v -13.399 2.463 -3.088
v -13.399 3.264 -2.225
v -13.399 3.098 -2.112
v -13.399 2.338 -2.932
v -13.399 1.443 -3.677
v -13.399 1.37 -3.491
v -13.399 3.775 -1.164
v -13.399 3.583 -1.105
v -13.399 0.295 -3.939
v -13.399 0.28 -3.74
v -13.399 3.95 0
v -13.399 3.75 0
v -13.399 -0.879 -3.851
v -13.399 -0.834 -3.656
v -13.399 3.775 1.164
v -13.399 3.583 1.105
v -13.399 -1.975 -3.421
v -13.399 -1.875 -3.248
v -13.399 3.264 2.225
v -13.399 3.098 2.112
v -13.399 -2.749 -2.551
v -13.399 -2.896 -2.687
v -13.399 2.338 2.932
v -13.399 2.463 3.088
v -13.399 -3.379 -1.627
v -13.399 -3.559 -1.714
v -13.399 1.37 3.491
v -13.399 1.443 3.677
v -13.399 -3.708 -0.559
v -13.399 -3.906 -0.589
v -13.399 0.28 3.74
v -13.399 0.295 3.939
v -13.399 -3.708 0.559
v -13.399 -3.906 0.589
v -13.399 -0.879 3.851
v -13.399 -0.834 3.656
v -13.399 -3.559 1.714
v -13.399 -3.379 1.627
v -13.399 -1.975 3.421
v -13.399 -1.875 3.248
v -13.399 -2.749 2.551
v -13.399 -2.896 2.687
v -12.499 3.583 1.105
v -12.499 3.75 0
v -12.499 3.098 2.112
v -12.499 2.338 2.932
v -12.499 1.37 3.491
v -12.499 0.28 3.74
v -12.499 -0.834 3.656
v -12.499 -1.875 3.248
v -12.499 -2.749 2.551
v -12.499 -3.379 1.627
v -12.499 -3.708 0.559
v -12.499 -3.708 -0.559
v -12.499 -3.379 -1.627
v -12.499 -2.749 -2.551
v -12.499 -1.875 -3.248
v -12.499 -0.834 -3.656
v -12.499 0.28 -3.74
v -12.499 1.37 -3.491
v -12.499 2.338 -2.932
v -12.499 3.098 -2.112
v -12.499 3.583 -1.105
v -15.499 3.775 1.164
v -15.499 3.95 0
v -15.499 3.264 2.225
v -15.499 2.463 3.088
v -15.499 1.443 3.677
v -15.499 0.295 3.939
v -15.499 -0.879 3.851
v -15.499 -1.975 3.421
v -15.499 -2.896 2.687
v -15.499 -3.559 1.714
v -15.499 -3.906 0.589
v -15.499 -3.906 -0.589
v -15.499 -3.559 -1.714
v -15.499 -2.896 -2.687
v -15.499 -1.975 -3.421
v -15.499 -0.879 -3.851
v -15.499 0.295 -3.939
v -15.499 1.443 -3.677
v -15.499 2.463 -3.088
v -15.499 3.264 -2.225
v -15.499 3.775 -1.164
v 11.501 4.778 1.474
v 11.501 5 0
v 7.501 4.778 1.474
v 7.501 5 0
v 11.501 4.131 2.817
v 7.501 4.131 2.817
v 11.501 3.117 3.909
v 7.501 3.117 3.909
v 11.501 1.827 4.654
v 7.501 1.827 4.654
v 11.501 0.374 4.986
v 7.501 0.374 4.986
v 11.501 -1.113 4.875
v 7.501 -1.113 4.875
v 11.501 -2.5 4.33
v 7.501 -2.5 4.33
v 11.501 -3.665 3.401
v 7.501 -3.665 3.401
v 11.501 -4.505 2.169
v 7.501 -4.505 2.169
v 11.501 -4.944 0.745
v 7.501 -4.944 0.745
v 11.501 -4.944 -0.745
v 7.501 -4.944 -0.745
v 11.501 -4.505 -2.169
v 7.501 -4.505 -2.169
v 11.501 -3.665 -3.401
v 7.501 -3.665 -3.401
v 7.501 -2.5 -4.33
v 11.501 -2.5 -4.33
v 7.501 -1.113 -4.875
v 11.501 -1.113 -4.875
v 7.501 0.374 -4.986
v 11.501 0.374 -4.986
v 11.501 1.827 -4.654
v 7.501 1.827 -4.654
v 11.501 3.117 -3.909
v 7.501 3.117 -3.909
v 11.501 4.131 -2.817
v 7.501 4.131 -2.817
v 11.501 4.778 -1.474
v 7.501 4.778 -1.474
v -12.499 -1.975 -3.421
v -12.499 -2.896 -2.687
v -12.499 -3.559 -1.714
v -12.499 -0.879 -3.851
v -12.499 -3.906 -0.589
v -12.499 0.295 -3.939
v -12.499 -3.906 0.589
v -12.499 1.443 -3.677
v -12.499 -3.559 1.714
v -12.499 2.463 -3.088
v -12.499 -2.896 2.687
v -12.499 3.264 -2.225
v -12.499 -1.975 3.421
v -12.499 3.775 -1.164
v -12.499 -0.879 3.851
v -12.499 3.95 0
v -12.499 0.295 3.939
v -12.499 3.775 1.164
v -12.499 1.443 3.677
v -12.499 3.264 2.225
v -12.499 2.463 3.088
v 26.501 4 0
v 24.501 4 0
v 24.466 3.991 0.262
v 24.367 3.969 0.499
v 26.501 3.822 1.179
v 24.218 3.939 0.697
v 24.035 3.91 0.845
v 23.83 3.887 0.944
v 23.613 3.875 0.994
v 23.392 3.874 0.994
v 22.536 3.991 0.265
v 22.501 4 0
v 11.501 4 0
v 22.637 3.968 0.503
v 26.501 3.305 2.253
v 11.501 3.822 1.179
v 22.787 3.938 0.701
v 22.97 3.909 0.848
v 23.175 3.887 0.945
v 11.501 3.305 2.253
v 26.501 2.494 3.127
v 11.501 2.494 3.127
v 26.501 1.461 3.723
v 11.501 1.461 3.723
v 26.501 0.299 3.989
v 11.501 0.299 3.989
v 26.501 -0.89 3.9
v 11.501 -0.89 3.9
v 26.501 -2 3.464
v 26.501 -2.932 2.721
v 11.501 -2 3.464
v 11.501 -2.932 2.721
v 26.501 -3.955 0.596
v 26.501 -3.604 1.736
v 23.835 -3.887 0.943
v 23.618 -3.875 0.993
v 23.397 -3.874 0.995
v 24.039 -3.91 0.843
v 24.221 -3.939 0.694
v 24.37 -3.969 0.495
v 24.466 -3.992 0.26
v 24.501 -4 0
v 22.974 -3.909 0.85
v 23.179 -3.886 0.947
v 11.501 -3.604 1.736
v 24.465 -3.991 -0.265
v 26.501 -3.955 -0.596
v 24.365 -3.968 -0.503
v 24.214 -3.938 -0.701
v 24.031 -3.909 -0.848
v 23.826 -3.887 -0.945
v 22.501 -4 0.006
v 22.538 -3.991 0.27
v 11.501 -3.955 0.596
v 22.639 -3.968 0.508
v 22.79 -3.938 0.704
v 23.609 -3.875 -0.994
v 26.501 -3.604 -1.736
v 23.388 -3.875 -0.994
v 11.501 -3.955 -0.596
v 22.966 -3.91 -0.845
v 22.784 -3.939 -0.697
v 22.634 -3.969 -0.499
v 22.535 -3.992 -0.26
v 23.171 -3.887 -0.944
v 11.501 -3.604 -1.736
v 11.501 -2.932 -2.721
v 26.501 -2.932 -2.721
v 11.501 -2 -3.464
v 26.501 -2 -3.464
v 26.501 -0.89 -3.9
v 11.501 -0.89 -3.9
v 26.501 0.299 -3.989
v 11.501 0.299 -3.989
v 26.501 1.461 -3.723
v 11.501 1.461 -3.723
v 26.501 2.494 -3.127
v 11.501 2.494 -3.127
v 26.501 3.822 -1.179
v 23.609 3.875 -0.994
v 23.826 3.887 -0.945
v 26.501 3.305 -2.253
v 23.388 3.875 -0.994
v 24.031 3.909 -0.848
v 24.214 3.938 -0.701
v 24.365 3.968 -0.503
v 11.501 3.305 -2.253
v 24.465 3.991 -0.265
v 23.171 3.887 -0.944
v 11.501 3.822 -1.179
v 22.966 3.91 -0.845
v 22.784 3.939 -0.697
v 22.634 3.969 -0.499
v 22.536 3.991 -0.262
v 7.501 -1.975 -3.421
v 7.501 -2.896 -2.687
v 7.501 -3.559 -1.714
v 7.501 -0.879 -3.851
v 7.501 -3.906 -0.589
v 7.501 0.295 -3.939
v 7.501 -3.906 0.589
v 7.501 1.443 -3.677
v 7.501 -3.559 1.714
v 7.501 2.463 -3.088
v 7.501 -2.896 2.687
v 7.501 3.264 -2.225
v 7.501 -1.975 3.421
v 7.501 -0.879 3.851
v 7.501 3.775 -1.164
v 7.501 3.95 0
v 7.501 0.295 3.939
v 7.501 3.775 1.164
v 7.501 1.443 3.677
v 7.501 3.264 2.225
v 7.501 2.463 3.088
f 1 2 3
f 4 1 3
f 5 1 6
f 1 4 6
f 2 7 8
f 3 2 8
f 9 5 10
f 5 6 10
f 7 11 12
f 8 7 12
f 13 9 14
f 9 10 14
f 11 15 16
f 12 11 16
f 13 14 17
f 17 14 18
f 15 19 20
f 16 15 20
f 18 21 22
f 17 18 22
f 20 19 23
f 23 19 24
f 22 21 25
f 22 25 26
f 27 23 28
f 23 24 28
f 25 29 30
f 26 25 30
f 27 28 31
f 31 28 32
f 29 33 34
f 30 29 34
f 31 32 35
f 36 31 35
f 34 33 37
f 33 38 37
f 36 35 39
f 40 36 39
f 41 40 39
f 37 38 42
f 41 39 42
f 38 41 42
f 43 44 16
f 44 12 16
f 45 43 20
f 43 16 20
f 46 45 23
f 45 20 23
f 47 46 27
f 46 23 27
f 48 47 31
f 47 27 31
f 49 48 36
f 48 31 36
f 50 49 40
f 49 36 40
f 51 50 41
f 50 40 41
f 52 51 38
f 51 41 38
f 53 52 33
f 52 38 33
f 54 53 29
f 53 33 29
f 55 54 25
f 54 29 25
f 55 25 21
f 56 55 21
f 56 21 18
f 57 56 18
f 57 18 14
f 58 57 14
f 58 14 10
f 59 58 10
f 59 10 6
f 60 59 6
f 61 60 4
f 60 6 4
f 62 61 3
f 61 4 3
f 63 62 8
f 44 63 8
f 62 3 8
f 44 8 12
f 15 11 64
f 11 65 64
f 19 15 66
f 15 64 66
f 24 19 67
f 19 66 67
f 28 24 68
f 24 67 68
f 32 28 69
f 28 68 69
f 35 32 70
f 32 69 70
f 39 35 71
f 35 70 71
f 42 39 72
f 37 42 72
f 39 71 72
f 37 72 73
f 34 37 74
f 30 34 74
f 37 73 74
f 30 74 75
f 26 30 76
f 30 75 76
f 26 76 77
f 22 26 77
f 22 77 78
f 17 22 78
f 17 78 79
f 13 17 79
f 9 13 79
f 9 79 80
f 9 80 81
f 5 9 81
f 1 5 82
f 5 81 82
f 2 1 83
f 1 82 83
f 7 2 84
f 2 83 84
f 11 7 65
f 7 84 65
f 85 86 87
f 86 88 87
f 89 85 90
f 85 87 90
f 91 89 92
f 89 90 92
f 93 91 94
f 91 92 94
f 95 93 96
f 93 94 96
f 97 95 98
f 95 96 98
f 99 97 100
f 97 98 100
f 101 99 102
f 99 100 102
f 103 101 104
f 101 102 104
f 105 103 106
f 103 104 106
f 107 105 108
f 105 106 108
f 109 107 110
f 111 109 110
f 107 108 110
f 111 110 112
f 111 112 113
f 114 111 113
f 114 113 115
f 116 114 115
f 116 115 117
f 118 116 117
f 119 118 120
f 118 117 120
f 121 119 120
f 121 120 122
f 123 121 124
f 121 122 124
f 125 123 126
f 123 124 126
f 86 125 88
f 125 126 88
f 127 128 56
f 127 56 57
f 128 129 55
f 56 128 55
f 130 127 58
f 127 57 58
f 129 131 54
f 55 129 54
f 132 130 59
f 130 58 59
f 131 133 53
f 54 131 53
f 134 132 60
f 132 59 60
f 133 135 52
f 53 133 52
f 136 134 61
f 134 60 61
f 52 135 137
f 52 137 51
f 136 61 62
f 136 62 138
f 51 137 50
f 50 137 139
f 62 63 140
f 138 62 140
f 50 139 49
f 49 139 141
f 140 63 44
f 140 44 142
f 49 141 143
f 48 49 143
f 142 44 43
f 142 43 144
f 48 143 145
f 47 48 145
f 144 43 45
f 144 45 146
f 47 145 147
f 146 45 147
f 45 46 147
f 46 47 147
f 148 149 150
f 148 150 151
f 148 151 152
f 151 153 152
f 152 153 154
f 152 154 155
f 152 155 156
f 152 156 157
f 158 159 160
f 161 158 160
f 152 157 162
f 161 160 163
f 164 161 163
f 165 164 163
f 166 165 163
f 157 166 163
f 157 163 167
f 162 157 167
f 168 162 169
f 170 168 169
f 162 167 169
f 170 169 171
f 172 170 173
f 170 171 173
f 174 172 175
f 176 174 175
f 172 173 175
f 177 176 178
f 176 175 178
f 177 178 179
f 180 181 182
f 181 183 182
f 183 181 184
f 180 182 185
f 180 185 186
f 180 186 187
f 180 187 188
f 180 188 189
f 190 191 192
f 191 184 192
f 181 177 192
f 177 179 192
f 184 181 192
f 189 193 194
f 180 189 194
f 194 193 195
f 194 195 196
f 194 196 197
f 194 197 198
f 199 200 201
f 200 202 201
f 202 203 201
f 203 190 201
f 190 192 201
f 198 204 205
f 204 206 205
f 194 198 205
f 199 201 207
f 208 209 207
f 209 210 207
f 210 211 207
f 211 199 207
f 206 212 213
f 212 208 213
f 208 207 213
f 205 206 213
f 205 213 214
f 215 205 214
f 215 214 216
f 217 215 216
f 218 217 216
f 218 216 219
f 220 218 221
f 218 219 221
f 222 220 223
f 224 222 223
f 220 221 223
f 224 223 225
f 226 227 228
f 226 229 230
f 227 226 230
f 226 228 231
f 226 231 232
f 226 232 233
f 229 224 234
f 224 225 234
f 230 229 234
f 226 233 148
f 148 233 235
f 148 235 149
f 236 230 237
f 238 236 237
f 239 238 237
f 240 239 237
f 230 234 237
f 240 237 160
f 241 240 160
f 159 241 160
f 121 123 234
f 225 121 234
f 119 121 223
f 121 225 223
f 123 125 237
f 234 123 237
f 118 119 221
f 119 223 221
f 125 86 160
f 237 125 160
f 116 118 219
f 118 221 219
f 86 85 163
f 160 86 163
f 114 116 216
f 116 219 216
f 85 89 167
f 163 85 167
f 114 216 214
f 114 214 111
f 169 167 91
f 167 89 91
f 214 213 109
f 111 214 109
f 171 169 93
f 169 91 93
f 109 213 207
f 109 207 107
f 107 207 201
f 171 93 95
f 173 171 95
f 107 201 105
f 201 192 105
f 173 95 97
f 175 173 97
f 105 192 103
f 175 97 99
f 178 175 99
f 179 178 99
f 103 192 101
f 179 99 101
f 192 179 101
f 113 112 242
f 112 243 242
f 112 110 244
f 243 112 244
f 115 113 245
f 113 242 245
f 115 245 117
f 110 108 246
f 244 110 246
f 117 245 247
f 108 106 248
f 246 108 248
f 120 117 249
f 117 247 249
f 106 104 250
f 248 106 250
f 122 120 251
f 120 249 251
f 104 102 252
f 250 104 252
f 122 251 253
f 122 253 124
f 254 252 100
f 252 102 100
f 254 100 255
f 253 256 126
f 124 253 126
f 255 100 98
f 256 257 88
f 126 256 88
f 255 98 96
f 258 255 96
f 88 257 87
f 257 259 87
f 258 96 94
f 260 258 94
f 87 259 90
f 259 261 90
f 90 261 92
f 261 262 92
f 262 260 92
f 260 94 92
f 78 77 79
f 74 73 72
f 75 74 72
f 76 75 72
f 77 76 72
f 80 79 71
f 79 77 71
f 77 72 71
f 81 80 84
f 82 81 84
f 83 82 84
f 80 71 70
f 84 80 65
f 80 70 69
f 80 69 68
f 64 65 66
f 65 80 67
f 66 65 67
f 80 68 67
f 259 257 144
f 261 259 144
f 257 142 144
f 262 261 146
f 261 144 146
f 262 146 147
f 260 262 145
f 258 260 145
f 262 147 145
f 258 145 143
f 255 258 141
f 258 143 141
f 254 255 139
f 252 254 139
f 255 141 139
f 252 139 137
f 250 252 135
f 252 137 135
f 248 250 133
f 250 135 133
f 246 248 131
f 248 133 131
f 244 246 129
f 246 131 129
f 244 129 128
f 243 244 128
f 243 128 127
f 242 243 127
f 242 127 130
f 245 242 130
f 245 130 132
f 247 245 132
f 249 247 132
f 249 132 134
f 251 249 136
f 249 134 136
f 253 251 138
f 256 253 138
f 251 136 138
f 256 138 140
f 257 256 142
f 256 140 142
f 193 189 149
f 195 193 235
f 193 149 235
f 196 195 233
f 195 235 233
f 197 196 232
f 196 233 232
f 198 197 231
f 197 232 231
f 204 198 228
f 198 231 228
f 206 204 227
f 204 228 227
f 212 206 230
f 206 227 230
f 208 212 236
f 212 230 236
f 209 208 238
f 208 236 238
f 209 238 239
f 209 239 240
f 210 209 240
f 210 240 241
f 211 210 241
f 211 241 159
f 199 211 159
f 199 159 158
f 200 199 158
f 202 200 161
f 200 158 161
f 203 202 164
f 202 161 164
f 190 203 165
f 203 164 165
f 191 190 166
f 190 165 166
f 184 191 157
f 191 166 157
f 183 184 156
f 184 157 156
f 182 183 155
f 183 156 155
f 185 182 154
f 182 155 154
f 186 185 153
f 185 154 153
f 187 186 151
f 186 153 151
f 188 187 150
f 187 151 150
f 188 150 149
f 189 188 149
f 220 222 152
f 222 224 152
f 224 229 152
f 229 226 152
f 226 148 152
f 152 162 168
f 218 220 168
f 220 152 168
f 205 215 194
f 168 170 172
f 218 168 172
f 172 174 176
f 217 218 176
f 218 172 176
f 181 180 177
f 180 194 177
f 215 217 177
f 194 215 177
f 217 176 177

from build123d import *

# Parameters (mm, degrees)
SKETCH_2_R          = 1
CUT_EXTRUDE_1_DEPTH = 5


with BuildPart() as part:
    # 草图1 → 旋转1 (revolve)
    with BuildSketch(Plane.XY):
        Polygon((-15.499429975, 0), (26.500570025, 0), (26.500570025, 4), (11.500570025, 4), (11.500570025, 5), (7.500570025, 5), (7.500570025, 3.95), (-12.499429975, 3.95), (-12.499429975, 3.75), (-13.399429975, 3.75), (-13.399429975, 3.95), (-15.499429975, 3.95), align=None)
    revolve(axis=Axis((-15.499429975, 0, 0), (1, 0, 0)))

    # 草图2 → 切除-拉伸1 (cut, symmetric)
    with BuildSketch(Plane(origin=(0, 0, 0), x_dir=(1, 0, 0), z_dir=(0, 1, 0))):
        with Locations((23.500570025, 0)):
            Circle(SKETCH_2_R)
    extrude(amount=CUT_EXTRUDE_1_DEPTH, both=True, mode=Mode.SUBTRACT)


solid = part.part
